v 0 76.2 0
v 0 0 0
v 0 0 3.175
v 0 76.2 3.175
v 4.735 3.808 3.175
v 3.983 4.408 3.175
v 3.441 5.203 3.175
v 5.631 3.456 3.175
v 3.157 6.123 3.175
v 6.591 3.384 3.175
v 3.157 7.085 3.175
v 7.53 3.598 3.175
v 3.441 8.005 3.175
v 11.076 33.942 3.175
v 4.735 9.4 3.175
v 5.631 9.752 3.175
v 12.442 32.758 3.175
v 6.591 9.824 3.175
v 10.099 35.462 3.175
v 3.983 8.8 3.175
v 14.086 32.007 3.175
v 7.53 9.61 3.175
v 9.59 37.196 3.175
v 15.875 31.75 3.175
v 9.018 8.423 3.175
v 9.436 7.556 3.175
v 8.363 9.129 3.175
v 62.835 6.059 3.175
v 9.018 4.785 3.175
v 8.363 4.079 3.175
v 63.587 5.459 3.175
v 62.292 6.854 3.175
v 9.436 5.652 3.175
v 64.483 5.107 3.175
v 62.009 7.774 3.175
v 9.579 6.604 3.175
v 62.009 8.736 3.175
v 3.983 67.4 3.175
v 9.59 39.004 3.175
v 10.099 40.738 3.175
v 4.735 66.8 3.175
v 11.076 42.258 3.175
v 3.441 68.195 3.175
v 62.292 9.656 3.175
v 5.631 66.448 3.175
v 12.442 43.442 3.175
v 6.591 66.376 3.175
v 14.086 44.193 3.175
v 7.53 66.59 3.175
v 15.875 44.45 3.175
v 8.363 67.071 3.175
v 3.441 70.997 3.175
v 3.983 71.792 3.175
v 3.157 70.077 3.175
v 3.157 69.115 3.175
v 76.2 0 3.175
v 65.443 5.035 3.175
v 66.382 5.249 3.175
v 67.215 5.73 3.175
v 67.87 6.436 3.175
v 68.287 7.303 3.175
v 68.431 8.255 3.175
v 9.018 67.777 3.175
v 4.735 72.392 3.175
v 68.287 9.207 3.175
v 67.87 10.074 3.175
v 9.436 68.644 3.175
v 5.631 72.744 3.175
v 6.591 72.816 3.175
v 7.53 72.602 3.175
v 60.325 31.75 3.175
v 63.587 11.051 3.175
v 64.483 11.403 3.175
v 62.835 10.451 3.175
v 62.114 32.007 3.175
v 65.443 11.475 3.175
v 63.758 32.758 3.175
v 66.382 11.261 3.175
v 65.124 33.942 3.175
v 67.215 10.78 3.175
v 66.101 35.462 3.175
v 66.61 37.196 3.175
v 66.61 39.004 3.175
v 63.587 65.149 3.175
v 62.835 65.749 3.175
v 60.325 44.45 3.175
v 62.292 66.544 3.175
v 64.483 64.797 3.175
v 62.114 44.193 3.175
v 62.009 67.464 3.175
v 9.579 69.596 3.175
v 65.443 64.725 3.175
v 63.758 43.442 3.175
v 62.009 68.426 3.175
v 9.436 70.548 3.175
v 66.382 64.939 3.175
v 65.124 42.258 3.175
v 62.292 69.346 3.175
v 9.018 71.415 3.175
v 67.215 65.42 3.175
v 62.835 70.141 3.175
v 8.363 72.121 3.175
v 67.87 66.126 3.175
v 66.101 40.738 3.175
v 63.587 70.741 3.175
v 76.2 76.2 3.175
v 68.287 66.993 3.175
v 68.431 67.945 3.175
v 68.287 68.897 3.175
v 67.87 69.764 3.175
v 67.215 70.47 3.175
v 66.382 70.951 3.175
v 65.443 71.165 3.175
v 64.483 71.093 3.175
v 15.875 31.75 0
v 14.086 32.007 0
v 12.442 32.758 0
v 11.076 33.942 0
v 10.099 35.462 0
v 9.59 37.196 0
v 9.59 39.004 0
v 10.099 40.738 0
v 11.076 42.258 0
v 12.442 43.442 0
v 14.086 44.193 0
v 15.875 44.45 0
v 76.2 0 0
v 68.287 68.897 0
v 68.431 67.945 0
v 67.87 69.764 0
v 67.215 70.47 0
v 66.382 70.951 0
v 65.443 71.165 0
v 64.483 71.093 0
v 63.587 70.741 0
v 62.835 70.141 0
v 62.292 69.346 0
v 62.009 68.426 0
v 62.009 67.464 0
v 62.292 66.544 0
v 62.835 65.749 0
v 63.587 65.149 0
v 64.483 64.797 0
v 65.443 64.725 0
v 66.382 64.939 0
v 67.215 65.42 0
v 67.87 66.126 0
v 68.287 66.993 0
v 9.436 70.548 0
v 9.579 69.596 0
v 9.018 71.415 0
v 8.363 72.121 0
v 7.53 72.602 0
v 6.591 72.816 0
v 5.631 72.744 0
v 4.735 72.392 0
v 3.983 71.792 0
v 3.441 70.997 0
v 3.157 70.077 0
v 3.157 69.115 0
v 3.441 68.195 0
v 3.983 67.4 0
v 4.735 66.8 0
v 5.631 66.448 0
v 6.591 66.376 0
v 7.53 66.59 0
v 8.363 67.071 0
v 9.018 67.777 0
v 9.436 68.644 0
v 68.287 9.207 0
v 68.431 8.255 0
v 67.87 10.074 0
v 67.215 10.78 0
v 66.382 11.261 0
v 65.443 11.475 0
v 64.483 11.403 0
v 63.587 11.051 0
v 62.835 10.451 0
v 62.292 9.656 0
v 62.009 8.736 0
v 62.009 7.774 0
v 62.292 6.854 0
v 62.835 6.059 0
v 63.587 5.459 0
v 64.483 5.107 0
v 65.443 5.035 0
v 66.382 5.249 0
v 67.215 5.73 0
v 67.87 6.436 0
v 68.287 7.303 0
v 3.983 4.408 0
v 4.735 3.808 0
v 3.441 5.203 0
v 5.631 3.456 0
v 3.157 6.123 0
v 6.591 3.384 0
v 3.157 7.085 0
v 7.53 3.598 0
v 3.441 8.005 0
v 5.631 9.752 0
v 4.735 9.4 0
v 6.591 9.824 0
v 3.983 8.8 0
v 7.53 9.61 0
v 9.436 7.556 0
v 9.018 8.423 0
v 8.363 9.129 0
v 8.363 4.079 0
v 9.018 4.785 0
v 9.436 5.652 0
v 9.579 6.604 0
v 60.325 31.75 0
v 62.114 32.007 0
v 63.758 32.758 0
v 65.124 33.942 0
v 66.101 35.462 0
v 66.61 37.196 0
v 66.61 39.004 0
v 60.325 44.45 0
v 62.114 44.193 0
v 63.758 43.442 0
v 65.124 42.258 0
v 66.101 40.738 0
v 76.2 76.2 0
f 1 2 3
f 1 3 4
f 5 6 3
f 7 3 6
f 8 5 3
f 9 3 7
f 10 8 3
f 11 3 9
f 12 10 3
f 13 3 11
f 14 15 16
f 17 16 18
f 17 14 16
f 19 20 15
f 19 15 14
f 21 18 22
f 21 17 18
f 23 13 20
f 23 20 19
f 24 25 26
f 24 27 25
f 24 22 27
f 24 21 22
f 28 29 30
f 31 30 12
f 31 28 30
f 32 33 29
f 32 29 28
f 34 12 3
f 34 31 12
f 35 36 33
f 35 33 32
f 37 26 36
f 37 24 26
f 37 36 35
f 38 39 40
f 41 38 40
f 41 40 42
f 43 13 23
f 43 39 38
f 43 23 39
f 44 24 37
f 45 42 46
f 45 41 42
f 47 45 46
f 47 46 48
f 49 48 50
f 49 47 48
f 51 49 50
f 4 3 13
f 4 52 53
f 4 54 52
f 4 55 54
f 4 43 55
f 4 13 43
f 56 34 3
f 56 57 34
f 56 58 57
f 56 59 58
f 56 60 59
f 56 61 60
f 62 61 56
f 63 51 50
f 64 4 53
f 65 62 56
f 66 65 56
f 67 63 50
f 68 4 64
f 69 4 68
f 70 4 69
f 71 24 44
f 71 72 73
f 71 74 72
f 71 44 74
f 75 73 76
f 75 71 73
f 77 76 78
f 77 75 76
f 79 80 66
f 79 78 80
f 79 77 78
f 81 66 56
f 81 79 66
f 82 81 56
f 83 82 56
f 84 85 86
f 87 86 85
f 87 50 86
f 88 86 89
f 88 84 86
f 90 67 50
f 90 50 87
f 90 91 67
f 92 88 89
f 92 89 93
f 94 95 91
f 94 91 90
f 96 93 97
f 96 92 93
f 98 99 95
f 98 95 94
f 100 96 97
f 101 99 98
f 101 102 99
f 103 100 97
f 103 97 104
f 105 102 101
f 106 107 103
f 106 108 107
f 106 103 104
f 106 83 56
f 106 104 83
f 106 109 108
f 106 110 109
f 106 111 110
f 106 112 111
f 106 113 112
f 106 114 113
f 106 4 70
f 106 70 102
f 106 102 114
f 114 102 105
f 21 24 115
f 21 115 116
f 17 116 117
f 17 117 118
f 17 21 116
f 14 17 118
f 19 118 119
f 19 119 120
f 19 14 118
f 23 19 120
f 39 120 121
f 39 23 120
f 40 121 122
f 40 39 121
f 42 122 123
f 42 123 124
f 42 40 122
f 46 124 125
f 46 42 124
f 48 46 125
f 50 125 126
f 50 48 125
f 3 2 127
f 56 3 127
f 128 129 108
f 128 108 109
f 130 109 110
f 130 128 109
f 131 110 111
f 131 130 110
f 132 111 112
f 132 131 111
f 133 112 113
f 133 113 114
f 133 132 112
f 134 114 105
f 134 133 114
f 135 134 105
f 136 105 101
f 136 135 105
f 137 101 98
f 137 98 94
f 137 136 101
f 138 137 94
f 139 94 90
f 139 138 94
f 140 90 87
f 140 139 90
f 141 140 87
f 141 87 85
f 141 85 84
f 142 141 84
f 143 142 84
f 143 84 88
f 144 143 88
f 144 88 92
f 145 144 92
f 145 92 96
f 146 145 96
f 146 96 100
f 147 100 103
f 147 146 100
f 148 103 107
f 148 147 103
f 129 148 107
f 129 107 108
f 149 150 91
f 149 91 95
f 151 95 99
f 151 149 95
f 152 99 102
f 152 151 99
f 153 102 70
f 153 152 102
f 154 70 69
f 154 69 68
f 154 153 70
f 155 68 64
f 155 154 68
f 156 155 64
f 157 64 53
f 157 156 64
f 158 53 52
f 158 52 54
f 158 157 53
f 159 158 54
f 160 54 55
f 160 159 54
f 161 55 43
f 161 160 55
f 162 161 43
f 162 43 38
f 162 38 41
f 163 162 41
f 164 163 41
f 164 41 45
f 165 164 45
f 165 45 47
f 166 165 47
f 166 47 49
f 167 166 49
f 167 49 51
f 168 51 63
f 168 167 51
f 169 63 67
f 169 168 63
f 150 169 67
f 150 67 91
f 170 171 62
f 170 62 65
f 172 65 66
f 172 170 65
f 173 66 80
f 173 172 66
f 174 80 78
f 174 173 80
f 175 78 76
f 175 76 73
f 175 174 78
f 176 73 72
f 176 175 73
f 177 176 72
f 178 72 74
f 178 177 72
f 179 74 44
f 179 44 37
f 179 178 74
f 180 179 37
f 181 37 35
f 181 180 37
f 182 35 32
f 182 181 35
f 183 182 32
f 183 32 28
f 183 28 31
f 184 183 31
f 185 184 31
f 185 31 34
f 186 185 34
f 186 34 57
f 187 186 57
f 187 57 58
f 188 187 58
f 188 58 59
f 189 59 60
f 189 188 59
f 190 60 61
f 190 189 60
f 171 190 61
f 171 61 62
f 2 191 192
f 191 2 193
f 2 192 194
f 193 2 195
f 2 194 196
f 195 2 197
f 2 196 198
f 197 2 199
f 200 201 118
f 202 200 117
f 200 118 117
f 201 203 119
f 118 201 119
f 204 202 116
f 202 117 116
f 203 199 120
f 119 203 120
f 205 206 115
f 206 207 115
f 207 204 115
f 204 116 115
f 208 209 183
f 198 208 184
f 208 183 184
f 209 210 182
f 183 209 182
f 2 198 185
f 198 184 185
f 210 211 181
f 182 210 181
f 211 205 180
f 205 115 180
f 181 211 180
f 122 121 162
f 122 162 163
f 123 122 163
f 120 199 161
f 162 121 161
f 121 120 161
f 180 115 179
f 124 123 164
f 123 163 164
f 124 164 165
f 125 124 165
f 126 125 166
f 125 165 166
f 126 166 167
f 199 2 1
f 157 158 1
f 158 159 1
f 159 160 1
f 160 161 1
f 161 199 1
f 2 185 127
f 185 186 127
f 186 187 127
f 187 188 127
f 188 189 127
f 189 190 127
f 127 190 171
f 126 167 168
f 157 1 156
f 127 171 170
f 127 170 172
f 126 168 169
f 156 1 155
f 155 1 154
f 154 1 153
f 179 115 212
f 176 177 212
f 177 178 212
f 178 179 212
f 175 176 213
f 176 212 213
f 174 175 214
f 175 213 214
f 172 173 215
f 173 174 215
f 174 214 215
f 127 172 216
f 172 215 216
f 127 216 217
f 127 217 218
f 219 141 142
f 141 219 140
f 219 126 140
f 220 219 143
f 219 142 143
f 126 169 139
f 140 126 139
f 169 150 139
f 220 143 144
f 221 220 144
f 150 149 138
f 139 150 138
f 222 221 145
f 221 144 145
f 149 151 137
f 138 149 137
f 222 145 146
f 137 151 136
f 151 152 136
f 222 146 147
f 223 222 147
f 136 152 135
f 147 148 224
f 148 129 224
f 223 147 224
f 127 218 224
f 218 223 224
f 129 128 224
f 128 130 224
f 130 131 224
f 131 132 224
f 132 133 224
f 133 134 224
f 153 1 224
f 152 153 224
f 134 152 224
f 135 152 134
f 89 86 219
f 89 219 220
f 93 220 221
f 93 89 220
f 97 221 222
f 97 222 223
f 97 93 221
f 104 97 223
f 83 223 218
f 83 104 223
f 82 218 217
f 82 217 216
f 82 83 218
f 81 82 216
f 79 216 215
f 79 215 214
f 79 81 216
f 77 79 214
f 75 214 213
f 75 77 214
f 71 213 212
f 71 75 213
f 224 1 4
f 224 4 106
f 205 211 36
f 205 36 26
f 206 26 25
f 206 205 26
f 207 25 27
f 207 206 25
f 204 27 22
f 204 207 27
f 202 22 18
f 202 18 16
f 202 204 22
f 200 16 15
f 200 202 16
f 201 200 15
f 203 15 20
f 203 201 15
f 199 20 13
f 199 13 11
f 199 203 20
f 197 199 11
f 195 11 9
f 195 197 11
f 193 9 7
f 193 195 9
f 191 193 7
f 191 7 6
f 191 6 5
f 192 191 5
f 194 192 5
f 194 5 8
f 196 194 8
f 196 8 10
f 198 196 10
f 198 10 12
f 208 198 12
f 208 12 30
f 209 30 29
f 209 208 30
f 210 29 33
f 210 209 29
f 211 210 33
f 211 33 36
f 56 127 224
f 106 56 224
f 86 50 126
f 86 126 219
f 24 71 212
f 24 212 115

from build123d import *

# Parameters (mm, degrees)
SKETCH1_W           = 76.2
SKETCH1_H           = 76.2
SKETCH1_R           = 3.229097739
BOSS_EXTRUDE3_DEPTH = 3.175
CUT_EXTRUDE1_DEPTH  = 3.175


with BuildPart() as part:
    # Sketch1 → Boss-Extrude3 (new body)
    with BuildSketch(Plane.XY):
        with Locations((38.1, 38.1)):
            Rectangle(SKETCH1_W, SKETCH1_H)
        with Locations((6.35, 69.596)):
            Circle(SKETCH1_R, mode=Mode.SUBTRACT)
        with Locations((6.35, 6.604)):
            Circle(SKETCH1_R, mode=Mode.SUBTRACT)
        with Locations((65.2018, 67.945)):
            Circle(SKETCH1_R, mode=Mode.SUBTRACT)
        with Locations((65.2018, 8.255)):
            Circle(SKETCH1_R, mode=Mode.SUBTRACT)
    extrude(amount=BOSS_EXTRUDE3_DEPTH)

    # Sketch2 → Cut-Extrude1 (cut)
    with BuildSketch(Plane.XY.offset(3.175)):
        with BuildLine():
            Line((15.875, 44.45), (60.325, 44.45))
            ThreePointArc((60.325, 44.45), (66.675, 38.1), (60.325, 31.75))
            Line((60.325, 31.75), (15.875, 31.75))
            ThreePointArc((15.875, 31.75), (9.525, 38.1), (15.875, 44.45))
        make_face()
    extrude(amount=-CUT_EXTRUDE1_DEPTH, mode=Mode.SUBTRACT)


solid = part.part
